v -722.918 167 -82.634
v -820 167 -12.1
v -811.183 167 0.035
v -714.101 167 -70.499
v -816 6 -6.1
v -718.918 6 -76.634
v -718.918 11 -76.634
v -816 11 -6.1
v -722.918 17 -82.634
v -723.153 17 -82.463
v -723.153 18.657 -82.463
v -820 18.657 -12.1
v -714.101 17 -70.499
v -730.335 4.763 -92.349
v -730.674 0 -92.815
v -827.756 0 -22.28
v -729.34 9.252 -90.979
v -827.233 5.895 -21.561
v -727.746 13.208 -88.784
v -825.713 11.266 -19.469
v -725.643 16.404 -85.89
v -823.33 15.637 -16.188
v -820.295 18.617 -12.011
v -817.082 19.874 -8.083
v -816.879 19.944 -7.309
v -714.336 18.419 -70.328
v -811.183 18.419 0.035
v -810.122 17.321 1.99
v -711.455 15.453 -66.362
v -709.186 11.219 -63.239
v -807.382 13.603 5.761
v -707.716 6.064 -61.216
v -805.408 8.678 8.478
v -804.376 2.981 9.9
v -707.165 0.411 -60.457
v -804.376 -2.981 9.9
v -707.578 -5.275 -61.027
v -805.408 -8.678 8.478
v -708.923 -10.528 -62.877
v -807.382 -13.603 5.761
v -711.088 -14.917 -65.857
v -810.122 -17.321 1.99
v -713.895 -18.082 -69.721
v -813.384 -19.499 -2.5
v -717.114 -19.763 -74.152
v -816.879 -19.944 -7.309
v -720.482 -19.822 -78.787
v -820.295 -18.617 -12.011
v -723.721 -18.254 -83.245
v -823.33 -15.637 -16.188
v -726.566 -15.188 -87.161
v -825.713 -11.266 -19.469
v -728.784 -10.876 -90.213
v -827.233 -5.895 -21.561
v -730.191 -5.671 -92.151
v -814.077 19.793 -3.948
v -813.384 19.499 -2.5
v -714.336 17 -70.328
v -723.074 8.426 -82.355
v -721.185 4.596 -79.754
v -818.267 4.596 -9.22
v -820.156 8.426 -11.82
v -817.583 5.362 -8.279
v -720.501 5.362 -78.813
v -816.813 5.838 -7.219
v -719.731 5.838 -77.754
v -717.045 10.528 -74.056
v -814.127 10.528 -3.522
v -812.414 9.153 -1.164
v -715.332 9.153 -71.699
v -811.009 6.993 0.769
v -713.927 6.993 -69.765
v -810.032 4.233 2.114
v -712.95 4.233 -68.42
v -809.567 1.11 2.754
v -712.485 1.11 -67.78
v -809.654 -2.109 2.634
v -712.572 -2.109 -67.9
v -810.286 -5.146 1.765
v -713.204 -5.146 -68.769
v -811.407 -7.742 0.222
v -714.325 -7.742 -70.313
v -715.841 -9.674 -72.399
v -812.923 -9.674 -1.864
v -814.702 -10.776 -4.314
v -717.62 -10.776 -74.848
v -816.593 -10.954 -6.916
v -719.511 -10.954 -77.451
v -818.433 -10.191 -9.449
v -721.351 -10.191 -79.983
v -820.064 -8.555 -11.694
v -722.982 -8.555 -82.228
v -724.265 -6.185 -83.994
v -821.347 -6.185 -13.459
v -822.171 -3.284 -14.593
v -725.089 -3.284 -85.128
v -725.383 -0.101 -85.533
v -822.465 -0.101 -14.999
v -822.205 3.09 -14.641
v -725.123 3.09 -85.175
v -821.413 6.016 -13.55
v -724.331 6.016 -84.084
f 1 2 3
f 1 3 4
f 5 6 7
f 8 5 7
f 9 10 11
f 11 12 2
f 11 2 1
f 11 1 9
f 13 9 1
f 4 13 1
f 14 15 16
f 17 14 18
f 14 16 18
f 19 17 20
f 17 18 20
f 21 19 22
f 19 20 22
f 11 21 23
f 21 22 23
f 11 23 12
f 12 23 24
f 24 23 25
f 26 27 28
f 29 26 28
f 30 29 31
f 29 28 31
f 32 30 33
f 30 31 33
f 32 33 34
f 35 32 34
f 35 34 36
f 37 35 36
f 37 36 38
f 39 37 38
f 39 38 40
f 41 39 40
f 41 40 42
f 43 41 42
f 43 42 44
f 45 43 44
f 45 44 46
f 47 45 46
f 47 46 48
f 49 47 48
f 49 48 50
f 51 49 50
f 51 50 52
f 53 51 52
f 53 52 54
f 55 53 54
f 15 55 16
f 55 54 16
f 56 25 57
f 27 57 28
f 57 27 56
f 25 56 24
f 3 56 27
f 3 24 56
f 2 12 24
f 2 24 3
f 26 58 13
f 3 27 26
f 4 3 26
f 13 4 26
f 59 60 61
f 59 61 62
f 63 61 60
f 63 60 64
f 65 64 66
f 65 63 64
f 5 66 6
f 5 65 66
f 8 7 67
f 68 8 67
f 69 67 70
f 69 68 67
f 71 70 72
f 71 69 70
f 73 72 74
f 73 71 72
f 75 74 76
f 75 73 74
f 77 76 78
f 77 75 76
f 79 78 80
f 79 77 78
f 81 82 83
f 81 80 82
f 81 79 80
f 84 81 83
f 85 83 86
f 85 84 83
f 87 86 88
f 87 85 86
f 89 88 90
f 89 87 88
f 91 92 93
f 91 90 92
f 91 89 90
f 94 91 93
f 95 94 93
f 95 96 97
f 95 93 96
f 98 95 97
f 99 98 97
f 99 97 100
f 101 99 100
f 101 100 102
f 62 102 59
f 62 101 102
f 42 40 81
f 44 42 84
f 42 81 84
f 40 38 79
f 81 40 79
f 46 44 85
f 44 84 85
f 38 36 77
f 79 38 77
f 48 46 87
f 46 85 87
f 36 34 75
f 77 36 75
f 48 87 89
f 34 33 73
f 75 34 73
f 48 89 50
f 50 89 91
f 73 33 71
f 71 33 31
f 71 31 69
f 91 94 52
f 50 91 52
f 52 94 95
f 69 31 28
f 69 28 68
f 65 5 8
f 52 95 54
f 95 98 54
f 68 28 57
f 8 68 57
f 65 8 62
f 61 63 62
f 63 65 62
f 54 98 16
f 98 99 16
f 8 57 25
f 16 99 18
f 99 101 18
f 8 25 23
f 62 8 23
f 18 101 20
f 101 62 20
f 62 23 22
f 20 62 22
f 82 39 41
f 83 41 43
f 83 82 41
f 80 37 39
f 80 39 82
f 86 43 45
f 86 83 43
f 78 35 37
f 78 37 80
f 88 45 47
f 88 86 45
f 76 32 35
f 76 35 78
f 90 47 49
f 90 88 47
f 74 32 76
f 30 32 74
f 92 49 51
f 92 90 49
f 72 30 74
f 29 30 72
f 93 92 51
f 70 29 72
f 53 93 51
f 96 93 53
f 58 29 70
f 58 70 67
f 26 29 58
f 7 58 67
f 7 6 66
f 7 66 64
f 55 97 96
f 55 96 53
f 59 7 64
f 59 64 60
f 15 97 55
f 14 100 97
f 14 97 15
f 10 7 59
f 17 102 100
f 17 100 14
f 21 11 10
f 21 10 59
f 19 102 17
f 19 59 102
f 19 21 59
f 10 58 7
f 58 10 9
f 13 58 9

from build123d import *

# Parameters (mm, degrees)
BOX130_W                    = 120
BOX130_H                    = 150
BOX130_DEPTH                = 15
BOX130_PITCH_ANGLE          = 36
CYLINDER281_R               = 5
CYLINDER281_DEPTH           = 130
CYLINDER281_PLACEMENT_ANGLE = 126
CYLINDER280_W               = 11
CYLINDER280_H               = 120
CYLINDER280_ANGLE           = 50
CYLINDER280_PLACEMENT_ANGLE = 126
CYLINDER283_R               = 6
CYLINDER283_DEPTH           = 130
CYLINDER283_PLACEMENT_ANGLE = 126
CYLINDER282_W               = 11
CYLINDER282_H               = 120
CYLINDER282_ANGLE           = 90
CYLINDER282_PLACEMENT_ANGLE = 126
CYLINDER279_R               = 11
CYLINDER279_DEPTH           = 120
CYLINDER279_PLACEMENT_ANGLE = 126
CYLINDER278_R               = 20
CYLINDER278_DEPTH           = 120
CYLINDER278_PLACEMENT_ANGLE = 126


with BuildPart() as cubo093:
    # Box130 → Box130 (new body)
    with BuildSketch(Plane.XY):
        with Locations((60, 75)):
            Rectangle(BOX130_W, BOX130_H)
    extrude(amount=BOX130_DEPTH)


with BuildPart() as cubo093_1:
    # Box130 pitch: moved
    add(cubo093.part.rotate(Axis((0, 0, 0), (0, 1, 0)), BOX130_PITCH_ANGLE))


with BuildPart() as cubo093_2:
    # Box130 placement: moved
    add(cubo093_1.part.moved(Location((-296, 17, 92.9))))


with BuildPart() as cilindro168:
    # Cylinder281 → Cylinder281 (new body)
    with BuildSketch(Plane.XY):
        Circle(CYLINDER281_R)
    extrude(amount=CYLINDER281_DEPTH)


with BuildPart() as cilindro168_1:
    # Cylinder281 placement: moved
    add(cilindro168.part.moved(Location((-292, 0, 98.9))).rotate(Axis((-292, 0, 98.9), (0, 1, 0)), CYLINDER281_PLACEMENT_ANGLE))


with BuildPart() as cut298:
    # Cylinder280 → Cylinder280 (revolve)
    with BuildSketch(Plane.XZ):
        with Locations((5.5, 60)):
            Rectangle(CYLINDER280_W, CYLINDER280_H)
    revolve(axis=Axis((0, 0, 0), (0, 0, 1)), revolution_arc=CYLINDER280_ANGLE)


with BuildPart() as cut298_1:
    # Cylinder280 placement: moved
    add(cut298.part.moved(Location((-292, 0, 98.9))).rotate(Axis((-292, 0, 98.9), (0, 1, 0)), CYLINDER280_PLACEMENT_ANGLE))

    # Cut298: cut Cilindro168
    add(cilindro168_1.part, mode=Mode.SUBTRACT)


with BuildPart() as cilindro170:
    # Cylinder283 → Cylinder283 (new body)
    with BuildSketch(Plane.XY):
        Circle(CYLINDER283_R)
    extrude(amount=CYLINDER283_DEPTH)


with BuildPart() as cilindro170_1:
    # Cylinder283 placement: moved
    add(cilindro170.part.moved(Location((-292, 0, 98.9))).rotate(Axis((-292, 0, 98.9), (0, 1, 0)), CYLINDER283_PLACEMENT_ANGLE))


with BuildPart() as cut300:
    # Cylinder282 → Cylinder282 (revolve)
    with BuildSketch(Plane.XZ):
        with Locations((5.5, 60)):
            Rectangle(CYLINDER282_W, CYLINDER282_H)
    revolve(axis=Axis((0, 0, 0), (0, 0, 1)), revolution_arc=CYLINDER282_ANGLE)


with BuildPart() as cut300_1:
    # Cylinder282 placement: moved
    add(cut300.part.moved(Location((-292, 0, 98.9))).rotate(Axis((-292, 0, 98.9), (0, 1, 0)), CYLINDER282_PLACEMENT_ANGLE))

    # Cut299: cut Cilindro170
    add(cilindro170_1.part, mode=Mode.SUBTRACT)

    # Cut300: cut Cut298
    add(cut298_1.part, mode=Mode.SUBTRACT)


with BuildPart() as cilindro166:
    # Cylinder279 → Cylinder279 (new body)
    with BuildSketch(Plane.XY):
        Circle(CYLINDER279_R)
    extrude(amount=CYLINDER279_DEPTH)


with BuildPart() as cilindro166_1:
    # Cylinder279 placement: moved
    add(cilindro166.part.moved(Location((-292, 0, 98.9))).rotate(Axis((-292, 0, 98.9), (0, 1, 0)), CYLINDER279_PLACEMENT_ANGLE))


with BuildPart() as fusion079:
    # Cylinder278 → Cylinder278 (new body)
    with BuildSketch(Plane.XY):
        Circle(CYLINDER278_R)
    extrude(amount=CYLINDER278_DEPTH)


with BuildPart() as fusion079_1:
    # Cylinder278 placement: moved
    add(fusion079.part.moved(Location((-292, 0, 98.9))).rotate(Axis((-292, 0, 98.9), (0, 1, 0)), CYLINDER278_PLACEMENT_ANGLE))

    # Cut297: cut Cilindro166
    add(cilindro166_1.part, mode=Mode.SUBTRACT)

    # Fusion078: union Cut300
    add(cut300_1.part)

    # Fusion079: union Cubo093
    add(cubo093_2.part)


with BuildPart() as fusion079_2:
    # Fusion079 placement: moved
    add(fusion079_1.part.moved(Location((-524, 0, -105))))


solid = fusion079_2.part
